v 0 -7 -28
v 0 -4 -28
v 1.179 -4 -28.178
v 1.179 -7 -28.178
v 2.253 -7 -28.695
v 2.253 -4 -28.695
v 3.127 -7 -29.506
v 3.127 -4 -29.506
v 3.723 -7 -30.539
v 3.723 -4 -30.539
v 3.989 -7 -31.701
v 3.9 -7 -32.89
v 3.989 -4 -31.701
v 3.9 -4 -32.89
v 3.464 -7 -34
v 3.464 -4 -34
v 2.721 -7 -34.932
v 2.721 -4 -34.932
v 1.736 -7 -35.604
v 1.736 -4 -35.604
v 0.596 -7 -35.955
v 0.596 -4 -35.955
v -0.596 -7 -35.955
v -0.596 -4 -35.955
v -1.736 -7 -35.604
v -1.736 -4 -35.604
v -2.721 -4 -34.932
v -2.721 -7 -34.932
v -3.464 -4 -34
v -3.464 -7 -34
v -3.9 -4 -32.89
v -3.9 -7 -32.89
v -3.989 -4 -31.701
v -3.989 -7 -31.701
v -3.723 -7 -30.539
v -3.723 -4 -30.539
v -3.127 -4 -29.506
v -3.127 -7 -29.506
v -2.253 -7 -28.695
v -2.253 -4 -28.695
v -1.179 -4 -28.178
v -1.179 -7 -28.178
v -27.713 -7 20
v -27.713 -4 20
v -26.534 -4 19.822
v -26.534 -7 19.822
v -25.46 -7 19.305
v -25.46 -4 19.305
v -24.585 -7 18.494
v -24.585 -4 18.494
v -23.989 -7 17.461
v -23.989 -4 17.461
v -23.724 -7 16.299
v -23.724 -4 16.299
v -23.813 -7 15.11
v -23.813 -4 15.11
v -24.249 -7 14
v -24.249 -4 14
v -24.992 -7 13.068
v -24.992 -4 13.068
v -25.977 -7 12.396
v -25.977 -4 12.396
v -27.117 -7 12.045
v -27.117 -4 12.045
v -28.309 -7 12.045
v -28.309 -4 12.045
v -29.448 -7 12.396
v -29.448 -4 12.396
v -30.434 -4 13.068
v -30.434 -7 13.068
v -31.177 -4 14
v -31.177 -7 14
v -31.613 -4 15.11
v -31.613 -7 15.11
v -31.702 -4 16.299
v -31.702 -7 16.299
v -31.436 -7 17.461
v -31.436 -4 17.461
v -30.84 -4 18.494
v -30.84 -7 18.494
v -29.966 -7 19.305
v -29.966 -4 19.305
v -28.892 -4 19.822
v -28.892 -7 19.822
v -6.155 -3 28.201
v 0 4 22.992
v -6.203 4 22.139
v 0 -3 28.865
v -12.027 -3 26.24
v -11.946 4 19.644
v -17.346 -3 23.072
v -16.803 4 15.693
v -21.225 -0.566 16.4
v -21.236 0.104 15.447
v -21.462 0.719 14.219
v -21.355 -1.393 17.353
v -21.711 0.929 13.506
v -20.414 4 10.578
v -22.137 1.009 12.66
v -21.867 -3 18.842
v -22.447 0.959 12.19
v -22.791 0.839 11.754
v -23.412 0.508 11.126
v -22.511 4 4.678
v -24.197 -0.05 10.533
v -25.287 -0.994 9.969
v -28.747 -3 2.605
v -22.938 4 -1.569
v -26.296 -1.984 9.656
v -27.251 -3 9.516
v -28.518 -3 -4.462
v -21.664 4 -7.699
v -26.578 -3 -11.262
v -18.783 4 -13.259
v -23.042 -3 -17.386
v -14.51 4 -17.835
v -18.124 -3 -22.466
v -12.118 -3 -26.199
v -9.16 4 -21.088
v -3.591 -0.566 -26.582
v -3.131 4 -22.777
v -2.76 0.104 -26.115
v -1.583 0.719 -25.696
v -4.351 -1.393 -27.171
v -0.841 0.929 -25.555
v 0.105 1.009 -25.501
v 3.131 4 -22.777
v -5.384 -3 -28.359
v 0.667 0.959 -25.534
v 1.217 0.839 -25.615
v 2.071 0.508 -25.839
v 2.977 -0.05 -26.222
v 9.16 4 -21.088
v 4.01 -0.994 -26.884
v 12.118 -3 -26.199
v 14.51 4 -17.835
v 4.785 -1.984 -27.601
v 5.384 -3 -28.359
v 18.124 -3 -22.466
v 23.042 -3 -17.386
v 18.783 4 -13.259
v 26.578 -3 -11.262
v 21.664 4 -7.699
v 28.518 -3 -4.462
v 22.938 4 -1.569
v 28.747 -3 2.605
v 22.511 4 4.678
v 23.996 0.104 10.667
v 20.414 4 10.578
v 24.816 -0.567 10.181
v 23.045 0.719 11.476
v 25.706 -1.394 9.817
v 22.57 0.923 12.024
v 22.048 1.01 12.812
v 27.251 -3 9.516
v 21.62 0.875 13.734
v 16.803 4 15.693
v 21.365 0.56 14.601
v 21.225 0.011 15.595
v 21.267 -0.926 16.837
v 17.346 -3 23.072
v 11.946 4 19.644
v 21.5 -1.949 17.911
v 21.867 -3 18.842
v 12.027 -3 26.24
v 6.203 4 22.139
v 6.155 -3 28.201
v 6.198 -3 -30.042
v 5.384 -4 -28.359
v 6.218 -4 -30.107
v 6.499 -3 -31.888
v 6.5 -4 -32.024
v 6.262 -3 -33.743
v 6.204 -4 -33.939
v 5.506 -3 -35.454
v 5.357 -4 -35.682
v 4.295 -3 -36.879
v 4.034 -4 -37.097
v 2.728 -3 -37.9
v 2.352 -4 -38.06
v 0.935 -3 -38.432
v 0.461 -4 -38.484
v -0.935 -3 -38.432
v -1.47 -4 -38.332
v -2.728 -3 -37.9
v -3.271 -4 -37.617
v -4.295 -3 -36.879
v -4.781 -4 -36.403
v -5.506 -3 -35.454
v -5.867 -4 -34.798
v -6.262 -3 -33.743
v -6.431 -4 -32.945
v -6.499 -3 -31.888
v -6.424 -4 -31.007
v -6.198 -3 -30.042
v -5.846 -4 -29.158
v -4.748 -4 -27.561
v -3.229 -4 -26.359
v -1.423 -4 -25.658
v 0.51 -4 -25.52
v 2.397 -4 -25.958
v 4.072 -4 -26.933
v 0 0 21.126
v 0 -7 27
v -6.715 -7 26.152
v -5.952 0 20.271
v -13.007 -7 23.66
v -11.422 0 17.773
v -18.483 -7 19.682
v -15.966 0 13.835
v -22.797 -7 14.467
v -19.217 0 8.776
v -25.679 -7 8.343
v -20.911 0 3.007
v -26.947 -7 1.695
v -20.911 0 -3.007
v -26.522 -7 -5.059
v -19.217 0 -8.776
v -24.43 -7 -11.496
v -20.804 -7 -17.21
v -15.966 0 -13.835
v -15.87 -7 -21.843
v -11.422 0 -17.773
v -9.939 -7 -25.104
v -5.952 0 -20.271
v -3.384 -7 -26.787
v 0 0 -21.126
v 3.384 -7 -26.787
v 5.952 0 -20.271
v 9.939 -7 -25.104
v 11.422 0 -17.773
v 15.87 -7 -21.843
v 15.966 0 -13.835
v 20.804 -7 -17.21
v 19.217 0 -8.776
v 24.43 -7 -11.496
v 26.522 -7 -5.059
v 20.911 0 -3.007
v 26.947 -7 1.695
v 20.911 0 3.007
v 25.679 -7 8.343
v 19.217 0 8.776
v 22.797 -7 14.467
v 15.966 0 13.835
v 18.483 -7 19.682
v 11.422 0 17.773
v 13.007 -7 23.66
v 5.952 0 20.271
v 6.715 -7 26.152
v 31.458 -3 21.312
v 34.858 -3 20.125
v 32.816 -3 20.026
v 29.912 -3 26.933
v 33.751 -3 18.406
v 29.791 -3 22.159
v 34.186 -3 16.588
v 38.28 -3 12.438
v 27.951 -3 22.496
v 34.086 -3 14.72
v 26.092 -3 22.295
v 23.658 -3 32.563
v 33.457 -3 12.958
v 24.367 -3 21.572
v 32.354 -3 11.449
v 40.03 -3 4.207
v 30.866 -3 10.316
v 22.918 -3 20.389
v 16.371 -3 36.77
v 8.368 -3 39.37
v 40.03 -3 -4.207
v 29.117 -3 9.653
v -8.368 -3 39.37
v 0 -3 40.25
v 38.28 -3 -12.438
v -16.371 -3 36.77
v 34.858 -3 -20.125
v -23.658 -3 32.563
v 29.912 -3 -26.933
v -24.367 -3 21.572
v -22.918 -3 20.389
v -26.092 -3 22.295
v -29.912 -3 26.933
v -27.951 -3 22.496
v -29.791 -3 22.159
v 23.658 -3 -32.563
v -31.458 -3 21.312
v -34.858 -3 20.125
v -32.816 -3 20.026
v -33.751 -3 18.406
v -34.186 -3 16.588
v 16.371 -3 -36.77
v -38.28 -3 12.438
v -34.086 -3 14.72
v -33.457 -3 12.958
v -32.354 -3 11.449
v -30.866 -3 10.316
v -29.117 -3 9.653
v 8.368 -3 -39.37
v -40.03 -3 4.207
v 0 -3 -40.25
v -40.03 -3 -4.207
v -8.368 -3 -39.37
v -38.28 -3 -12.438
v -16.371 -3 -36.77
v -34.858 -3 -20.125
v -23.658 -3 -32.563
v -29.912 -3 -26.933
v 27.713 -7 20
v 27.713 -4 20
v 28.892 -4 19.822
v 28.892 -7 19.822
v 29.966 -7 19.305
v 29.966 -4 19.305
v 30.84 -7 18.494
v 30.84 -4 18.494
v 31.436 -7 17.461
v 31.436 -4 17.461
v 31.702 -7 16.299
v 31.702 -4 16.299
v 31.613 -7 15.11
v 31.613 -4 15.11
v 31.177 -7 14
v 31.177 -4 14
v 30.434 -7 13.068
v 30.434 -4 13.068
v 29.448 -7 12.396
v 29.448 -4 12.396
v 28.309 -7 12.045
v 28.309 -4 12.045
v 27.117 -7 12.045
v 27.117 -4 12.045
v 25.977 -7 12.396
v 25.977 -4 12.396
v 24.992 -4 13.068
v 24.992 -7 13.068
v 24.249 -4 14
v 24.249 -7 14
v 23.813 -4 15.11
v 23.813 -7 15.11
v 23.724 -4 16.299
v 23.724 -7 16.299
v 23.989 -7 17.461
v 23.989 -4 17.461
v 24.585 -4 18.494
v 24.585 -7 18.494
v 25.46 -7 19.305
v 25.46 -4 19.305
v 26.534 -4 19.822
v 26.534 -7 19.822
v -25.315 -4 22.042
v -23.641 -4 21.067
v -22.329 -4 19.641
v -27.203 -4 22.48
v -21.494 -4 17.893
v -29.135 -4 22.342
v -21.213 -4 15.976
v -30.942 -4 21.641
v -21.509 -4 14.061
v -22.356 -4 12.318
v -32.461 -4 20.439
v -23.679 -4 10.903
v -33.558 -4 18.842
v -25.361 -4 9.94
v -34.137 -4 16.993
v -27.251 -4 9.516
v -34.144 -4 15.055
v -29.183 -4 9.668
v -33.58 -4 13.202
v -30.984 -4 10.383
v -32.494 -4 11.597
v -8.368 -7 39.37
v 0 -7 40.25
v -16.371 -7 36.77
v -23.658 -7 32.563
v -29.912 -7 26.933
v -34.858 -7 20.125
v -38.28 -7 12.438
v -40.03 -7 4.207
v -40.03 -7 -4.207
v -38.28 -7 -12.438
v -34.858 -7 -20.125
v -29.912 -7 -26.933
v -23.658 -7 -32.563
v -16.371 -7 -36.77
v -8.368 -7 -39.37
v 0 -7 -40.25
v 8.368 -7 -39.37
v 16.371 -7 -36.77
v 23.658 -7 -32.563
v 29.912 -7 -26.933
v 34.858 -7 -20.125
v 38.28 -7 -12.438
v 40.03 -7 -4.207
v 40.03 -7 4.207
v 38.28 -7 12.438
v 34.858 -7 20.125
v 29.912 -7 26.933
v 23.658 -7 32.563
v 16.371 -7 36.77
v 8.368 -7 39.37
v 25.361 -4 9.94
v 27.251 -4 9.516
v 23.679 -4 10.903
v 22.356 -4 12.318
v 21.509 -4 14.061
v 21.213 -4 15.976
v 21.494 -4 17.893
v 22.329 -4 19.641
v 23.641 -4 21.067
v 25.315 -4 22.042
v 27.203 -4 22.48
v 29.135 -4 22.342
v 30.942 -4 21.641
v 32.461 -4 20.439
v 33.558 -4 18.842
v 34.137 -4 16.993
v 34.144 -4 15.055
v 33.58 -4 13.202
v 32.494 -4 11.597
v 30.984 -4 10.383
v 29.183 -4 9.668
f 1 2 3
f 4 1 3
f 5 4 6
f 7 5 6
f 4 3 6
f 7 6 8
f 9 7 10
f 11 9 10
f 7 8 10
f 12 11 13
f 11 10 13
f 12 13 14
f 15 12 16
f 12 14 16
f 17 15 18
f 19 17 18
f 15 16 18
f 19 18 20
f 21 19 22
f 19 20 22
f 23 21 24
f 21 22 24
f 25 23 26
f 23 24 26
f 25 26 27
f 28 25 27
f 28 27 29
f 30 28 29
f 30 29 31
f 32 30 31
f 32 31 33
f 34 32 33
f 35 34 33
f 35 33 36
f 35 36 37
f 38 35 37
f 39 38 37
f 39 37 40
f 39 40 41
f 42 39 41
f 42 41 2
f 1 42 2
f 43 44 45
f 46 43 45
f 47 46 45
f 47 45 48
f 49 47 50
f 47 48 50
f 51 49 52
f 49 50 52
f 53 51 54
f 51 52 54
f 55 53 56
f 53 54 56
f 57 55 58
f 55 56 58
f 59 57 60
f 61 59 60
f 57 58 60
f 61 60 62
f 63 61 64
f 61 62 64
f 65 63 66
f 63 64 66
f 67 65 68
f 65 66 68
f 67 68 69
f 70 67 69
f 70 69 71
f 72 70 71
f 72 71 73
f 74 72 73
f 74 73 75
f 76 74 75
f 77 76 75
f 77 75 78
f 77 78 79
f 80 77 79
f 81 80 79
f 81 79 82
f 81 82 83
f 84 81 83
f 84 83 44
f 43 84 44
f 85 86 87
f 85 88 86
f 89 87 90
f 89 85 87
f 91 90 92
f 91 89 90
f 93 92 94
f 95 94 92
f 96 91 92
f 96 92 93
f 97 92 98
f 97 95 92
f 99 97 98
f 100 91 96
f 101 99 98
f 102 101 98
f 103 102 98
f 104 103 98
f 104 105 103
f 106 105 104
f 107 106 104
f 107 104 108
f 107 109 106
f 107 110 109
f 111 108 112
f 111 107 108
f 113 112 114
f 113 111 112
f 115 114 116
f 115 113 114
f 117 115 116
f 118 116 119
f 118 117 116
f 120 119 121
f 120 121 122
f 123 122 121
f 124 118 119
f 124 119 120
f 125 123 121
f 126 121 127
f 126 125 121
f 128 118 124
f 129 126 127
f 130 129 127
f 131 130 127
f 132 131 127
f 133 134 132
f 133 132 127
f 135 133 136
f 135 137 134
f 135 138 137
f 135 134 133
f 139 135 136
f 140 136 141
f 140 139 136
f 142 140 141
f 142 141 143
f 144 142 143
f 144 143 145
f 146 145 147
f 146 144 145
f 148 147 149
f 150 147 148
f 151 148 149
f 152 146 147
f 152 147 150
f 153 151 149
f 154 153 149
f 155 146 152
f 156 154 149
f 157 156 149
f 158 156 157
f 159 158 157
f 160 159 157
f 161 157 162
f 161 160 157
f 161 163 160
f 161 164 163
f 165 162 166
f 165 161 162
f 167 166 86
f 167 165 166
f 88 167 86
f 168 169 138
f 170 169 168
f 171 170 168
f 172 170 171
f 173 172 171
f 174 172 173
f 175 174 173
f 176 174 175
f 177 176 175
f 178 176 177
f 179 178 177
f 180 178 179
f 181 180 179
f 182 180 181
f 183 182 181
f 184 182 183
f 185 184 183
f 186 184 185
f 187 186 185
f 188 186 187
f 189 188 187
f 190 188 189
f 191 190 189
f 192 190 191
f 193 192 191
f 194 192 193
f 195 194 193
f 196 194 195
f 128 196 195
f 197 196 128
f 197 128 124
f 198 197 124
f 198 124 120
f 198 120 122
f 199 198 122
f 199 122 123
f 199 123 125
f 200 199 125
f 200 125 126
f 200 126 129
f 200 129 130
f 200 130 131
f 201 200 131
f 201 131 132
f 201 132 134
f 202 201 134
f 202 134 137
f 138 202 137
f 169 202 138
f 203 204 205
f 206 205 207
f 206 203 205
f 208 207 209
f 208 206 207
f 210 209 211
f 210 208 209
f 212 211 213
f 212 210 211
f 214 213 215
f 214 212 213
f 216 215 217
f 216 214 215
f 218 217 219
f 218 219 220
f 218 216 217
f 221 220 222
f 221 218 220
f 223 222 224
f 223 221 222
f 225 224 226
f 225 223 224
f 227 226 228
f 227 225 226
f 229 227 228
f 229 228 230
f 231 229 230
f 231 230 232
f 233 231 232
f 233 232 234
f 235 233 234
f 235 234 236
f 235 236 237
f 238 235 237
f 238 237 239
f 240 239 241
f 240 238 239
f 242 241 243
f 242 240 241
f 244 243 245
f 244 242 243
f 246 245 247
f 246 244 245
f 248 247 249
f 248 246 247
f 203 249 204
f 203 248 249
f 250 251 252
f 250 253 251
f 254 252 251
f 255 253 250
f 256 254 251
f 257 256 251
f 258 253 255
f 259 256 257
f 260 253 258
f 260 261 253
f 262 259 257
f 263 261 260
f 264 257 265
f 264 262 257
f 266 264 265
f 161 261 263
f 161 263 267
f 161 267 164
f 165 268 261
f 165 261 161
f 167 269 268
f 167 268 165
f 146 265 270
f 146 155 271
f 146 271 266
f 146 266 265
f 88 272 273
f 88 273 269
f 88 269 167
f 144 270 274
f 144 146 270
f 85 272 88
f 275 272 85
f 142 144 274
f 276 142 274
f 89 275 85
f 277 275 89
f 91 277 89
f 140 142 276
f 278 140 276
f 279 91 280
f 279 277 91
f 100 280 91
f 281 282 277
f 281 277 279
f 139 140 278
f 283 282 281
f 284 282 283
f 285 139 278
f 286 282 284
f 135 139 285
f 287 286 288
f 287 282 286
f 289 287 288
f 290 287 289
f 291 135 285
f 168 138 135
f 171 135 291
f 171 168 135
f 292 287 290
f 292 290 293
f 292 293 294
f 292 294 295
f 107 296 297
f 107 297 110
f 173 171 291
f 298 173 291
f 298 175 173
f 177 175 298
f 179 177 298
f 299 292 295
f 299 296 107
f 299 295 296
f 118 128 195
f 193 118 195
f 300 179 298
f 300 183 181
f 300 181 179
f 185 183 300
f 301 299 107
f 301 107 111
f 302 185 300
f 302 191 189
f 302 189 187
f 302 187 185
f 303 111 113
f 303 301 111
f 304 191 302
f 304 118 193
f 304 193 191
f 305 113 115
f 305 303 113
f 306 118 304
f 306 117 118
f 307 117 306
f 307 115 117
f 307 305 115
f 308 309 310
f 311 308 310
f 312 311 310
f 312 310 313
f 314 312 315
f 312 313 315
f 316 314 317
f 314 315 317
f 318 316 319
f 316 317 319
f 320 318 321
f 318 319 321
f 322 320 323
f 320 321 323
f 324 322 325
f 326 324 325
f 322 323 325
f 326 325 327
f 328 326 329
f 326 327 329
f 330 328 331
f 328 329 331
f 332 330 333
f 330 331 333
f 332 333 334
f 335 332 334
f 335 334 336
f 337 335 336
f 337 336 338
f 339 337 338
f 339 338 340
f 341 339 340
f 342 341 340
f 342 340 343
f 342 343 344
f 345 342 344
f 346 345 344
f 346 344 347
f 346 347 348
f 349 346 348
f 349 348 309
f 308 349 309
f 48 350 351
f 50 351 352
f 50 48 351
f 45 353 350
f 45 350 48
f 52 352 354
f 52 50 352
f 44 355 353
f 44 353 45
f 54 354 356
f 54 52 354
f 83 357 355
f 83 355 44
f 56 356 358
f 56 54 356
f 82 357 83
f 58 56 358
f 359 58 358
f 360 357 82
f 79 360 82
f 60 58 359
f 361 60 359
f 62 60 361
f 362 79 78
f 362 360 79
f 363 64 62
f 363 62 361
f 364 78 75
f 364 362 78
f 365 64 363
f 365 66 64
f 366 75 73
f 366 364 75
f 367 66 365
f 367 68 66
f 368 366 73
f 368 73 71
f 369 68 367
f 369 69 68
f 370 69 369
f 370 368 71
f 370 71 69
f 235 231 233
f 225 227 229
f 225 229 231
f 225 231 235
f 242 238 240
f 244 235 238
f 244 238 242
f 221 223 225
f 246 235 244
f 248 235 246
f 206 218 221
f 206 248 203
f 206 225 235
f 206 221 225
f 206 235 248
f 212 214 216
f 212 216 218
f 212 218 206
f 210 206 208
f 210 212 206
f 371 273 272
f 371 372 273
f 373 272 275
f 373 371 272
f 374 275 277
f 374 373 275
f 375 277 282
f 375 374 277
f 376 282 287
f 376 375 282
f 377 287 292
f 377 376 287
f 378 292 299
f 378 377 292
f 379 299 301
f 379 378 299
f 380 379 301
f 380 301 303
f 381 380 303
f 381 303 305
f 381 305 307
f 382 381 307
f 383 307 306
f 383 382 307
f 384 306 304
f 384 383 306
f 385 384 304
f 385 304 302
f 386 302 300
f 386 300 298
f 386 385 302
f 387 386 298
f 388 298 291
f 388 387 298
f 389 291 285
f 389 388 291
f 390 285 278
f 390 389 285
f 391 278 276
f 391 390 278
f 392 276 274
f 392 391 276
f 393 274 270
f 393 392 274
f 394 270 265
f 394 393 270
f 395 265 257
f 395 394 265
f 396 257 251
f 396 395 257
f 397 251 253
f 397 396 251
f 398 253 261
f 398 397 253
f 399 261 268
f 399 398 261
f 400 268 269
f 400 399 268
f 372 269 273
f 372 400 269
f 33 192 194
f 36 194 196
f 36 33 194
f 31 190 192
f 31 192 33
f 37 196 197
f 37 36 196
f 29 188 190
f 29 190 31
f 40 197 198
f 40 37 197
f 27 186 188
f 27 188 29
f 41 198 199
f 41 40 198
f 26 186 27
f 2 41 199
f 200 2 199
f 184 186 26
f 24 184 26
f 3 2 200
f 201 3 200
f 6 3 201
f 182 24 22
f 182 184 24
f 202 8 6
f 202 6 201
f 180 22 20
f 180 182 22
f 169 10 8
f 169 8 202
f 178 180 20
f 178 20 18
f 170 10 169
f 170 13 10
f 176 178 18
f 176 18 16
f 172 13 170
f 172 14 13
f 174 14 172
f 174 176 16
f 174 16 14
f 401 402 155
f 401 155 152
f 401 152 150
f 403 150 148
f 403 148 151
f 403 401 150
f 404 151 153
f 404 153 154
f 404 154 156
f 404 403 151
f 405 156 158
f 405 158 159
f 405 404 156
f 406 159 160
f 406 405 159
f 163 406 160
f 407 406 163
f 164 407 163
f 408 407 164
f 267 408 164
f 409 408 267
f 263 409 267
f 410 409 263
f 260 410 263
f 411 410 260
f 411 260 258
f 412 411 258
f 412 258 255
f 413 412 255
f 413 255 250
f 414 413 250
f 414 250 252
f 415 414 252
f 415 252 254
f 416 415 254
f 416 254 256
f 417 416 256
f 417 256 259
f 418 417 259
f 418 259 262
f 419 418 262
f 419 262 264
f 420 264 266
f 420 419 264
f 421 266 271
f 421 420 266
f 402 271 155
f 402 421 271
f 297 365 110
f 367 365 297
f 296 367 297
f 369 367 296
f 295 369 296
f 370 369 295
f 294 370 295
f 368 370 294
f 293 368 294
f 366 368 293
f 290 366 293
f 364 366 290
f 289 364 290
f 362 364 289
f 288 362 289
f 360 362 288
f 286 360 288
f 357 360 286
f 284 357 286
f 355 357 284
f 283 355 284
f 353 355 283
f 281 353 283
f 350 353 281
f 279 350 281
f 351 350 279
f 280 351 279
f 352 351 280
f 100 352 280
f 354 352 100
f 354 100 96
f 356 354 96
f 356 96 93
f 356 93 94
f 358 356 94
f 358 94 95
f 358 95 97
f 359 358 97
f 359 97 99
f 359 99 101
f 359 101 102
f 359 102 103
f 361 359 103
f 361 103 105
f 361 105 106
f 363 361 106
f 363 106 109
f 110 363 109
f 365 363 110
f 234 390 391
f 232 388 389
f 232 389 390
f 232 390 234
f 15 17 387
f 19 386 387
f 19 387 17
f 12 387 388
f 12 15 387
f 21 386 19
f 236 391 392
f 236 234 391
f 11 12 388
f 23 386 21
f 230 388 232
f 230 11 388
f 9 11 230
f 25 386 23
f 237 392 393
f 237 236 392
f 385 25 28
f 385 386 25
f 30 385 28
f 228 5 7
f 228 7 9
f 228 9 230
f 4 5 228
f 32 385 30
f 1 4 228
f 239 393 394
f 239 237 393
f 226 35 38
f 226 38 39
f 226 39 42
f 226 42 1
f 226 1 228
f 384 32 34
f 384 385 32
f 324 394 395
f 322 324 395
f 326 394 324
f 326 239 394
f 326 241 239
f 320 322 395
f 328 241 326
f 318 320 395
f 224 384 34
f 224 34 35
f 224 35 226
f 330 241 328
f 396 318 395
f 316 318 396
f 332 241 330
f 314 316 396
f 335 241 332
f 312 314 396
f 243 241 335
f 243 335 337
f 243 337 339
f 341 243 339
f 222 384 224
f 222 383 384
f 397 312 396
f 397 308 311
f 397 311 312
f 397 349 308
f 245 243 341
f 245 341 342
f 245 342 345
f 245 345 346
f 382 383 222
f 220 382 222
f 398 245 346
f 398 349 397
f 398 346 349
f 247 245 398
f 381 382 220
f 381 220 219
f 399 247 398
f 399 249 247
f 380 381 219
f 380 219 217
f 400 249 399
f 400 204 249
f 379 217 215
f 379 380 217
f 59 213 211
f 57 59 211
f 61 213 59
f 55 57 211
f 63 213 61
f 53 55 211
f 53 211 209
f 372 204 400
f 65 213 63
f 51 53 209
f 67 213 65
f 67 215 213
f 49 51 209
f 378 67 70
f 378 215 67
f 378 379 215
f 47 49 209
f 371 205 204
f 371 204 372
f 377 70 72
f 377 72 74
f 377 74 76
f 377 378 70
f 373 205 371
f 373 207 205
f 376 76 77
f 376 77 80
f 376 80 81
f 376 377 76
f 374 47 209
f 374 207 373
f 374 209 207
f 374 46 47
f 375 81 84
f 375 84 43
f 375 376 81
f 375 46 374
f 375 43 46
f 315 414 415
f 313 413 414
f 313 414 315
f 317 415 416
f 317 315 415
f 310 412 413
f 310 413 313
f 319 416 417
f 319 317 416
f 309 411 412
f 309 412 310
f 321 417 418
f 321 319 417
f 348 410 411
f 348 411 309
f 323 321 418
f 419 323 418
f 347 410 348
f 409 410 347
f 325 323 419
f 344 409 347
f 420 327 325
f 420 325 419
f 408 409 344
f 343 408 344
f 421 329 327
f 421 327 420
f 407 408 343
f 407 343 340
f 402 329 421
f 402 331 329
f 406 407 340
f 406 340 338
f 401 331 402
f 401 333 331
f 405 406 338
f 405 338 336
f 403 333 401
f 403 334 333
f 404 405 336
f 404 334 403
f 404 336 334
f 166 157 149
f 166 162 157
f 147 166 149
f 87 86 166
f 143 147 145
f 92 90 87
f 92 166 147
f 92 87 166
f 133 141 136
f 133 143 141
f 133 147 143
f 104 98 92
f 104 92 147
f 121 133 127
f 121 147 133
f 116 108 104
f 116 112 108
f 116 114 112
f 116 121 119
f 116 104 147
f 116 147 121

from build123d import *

# Parameters (mm, degrees)
SKETCH2_R               = 4
CUT_EXTRUDE1_DEPTH      = 58.350893629
CUT_EXTRUDE2_DEPTH      = 58.350893629
CUT_EXTRUDE2_DEPTH_BACK = 1
SKETCH3_R               = 6.5


with BuildPart() as part:
    # Sketch1 → Revolve1 (revolve)
    with BuildSketch(Plane.XY, mode=Mode.PRIVATE) as revolve1_sk:
        Polygon((0, 0), (0, 4), (-22.991533214, 4), (-28.865230633, -3), (-40.25, -3), (-40.25, -7), (-27, -7), (-21.126302582, 0), align=None)
    revolve(revolve1_sk.sketch.rotate(Axis((0, 4, 0), (0, -1, 0)), 270), axis=Axis((0, 4, 0), (0, -1, 0)))

    # Sketch2 → Cut-Extrude1 (cut, through all)
    with BuildSketch(Plane(origin=(0, -3, 0), x_dir=(1, 0, 0), z_dir=(0, 1, 0))):
        with Locations(Location((0, 32, 0), (0, 0, 270))):
            Circle(SKETCH2_R)
        with Locations(Location((27.712812921, -16, 0), (0, 0, 270))):
            Circle(SKETCH2_R)
        with Locations(Location((-27.712812921, -16, 0), (0, 0, 270))):
            Circle(SKETCH2_R)
    extrude(amount=-CUT_EXTRUDE1_DEPTH, mode=Mode.SUBTRACT)

    # Sketch3 → Cut-Extrude2 (cut, two sides: drawn at the far end of the back side and taken through both)
    with BuildSketch(Plane(origin=(0, -3, 0), x_dir=(1, 0, 0), z_dir=(0, 1, 0)).offset(-CUT_EXTRUDE2_DEPTH_BACK)):
        with Locations(Location((0, 32, 0), (0, 0, 325.92949513))):
            Circle(SKETCH3_R)
        with Locations(Location((27.712812921, -16, 0), (0, 0, 94.070504949))):
            Circle(SKETCH3_R)
        with Locations(Location((-27.712812921, -16, 0), (0, 0, 85.92949513))):
            Circle(SKETCH3_R)
    extrude(amount=CUT_EXTRUDE2_DEPTH + CUT_EXTRUDE2_DEPTH_BACK, mode=Mode.SUBTRACT)


solid = part.part
